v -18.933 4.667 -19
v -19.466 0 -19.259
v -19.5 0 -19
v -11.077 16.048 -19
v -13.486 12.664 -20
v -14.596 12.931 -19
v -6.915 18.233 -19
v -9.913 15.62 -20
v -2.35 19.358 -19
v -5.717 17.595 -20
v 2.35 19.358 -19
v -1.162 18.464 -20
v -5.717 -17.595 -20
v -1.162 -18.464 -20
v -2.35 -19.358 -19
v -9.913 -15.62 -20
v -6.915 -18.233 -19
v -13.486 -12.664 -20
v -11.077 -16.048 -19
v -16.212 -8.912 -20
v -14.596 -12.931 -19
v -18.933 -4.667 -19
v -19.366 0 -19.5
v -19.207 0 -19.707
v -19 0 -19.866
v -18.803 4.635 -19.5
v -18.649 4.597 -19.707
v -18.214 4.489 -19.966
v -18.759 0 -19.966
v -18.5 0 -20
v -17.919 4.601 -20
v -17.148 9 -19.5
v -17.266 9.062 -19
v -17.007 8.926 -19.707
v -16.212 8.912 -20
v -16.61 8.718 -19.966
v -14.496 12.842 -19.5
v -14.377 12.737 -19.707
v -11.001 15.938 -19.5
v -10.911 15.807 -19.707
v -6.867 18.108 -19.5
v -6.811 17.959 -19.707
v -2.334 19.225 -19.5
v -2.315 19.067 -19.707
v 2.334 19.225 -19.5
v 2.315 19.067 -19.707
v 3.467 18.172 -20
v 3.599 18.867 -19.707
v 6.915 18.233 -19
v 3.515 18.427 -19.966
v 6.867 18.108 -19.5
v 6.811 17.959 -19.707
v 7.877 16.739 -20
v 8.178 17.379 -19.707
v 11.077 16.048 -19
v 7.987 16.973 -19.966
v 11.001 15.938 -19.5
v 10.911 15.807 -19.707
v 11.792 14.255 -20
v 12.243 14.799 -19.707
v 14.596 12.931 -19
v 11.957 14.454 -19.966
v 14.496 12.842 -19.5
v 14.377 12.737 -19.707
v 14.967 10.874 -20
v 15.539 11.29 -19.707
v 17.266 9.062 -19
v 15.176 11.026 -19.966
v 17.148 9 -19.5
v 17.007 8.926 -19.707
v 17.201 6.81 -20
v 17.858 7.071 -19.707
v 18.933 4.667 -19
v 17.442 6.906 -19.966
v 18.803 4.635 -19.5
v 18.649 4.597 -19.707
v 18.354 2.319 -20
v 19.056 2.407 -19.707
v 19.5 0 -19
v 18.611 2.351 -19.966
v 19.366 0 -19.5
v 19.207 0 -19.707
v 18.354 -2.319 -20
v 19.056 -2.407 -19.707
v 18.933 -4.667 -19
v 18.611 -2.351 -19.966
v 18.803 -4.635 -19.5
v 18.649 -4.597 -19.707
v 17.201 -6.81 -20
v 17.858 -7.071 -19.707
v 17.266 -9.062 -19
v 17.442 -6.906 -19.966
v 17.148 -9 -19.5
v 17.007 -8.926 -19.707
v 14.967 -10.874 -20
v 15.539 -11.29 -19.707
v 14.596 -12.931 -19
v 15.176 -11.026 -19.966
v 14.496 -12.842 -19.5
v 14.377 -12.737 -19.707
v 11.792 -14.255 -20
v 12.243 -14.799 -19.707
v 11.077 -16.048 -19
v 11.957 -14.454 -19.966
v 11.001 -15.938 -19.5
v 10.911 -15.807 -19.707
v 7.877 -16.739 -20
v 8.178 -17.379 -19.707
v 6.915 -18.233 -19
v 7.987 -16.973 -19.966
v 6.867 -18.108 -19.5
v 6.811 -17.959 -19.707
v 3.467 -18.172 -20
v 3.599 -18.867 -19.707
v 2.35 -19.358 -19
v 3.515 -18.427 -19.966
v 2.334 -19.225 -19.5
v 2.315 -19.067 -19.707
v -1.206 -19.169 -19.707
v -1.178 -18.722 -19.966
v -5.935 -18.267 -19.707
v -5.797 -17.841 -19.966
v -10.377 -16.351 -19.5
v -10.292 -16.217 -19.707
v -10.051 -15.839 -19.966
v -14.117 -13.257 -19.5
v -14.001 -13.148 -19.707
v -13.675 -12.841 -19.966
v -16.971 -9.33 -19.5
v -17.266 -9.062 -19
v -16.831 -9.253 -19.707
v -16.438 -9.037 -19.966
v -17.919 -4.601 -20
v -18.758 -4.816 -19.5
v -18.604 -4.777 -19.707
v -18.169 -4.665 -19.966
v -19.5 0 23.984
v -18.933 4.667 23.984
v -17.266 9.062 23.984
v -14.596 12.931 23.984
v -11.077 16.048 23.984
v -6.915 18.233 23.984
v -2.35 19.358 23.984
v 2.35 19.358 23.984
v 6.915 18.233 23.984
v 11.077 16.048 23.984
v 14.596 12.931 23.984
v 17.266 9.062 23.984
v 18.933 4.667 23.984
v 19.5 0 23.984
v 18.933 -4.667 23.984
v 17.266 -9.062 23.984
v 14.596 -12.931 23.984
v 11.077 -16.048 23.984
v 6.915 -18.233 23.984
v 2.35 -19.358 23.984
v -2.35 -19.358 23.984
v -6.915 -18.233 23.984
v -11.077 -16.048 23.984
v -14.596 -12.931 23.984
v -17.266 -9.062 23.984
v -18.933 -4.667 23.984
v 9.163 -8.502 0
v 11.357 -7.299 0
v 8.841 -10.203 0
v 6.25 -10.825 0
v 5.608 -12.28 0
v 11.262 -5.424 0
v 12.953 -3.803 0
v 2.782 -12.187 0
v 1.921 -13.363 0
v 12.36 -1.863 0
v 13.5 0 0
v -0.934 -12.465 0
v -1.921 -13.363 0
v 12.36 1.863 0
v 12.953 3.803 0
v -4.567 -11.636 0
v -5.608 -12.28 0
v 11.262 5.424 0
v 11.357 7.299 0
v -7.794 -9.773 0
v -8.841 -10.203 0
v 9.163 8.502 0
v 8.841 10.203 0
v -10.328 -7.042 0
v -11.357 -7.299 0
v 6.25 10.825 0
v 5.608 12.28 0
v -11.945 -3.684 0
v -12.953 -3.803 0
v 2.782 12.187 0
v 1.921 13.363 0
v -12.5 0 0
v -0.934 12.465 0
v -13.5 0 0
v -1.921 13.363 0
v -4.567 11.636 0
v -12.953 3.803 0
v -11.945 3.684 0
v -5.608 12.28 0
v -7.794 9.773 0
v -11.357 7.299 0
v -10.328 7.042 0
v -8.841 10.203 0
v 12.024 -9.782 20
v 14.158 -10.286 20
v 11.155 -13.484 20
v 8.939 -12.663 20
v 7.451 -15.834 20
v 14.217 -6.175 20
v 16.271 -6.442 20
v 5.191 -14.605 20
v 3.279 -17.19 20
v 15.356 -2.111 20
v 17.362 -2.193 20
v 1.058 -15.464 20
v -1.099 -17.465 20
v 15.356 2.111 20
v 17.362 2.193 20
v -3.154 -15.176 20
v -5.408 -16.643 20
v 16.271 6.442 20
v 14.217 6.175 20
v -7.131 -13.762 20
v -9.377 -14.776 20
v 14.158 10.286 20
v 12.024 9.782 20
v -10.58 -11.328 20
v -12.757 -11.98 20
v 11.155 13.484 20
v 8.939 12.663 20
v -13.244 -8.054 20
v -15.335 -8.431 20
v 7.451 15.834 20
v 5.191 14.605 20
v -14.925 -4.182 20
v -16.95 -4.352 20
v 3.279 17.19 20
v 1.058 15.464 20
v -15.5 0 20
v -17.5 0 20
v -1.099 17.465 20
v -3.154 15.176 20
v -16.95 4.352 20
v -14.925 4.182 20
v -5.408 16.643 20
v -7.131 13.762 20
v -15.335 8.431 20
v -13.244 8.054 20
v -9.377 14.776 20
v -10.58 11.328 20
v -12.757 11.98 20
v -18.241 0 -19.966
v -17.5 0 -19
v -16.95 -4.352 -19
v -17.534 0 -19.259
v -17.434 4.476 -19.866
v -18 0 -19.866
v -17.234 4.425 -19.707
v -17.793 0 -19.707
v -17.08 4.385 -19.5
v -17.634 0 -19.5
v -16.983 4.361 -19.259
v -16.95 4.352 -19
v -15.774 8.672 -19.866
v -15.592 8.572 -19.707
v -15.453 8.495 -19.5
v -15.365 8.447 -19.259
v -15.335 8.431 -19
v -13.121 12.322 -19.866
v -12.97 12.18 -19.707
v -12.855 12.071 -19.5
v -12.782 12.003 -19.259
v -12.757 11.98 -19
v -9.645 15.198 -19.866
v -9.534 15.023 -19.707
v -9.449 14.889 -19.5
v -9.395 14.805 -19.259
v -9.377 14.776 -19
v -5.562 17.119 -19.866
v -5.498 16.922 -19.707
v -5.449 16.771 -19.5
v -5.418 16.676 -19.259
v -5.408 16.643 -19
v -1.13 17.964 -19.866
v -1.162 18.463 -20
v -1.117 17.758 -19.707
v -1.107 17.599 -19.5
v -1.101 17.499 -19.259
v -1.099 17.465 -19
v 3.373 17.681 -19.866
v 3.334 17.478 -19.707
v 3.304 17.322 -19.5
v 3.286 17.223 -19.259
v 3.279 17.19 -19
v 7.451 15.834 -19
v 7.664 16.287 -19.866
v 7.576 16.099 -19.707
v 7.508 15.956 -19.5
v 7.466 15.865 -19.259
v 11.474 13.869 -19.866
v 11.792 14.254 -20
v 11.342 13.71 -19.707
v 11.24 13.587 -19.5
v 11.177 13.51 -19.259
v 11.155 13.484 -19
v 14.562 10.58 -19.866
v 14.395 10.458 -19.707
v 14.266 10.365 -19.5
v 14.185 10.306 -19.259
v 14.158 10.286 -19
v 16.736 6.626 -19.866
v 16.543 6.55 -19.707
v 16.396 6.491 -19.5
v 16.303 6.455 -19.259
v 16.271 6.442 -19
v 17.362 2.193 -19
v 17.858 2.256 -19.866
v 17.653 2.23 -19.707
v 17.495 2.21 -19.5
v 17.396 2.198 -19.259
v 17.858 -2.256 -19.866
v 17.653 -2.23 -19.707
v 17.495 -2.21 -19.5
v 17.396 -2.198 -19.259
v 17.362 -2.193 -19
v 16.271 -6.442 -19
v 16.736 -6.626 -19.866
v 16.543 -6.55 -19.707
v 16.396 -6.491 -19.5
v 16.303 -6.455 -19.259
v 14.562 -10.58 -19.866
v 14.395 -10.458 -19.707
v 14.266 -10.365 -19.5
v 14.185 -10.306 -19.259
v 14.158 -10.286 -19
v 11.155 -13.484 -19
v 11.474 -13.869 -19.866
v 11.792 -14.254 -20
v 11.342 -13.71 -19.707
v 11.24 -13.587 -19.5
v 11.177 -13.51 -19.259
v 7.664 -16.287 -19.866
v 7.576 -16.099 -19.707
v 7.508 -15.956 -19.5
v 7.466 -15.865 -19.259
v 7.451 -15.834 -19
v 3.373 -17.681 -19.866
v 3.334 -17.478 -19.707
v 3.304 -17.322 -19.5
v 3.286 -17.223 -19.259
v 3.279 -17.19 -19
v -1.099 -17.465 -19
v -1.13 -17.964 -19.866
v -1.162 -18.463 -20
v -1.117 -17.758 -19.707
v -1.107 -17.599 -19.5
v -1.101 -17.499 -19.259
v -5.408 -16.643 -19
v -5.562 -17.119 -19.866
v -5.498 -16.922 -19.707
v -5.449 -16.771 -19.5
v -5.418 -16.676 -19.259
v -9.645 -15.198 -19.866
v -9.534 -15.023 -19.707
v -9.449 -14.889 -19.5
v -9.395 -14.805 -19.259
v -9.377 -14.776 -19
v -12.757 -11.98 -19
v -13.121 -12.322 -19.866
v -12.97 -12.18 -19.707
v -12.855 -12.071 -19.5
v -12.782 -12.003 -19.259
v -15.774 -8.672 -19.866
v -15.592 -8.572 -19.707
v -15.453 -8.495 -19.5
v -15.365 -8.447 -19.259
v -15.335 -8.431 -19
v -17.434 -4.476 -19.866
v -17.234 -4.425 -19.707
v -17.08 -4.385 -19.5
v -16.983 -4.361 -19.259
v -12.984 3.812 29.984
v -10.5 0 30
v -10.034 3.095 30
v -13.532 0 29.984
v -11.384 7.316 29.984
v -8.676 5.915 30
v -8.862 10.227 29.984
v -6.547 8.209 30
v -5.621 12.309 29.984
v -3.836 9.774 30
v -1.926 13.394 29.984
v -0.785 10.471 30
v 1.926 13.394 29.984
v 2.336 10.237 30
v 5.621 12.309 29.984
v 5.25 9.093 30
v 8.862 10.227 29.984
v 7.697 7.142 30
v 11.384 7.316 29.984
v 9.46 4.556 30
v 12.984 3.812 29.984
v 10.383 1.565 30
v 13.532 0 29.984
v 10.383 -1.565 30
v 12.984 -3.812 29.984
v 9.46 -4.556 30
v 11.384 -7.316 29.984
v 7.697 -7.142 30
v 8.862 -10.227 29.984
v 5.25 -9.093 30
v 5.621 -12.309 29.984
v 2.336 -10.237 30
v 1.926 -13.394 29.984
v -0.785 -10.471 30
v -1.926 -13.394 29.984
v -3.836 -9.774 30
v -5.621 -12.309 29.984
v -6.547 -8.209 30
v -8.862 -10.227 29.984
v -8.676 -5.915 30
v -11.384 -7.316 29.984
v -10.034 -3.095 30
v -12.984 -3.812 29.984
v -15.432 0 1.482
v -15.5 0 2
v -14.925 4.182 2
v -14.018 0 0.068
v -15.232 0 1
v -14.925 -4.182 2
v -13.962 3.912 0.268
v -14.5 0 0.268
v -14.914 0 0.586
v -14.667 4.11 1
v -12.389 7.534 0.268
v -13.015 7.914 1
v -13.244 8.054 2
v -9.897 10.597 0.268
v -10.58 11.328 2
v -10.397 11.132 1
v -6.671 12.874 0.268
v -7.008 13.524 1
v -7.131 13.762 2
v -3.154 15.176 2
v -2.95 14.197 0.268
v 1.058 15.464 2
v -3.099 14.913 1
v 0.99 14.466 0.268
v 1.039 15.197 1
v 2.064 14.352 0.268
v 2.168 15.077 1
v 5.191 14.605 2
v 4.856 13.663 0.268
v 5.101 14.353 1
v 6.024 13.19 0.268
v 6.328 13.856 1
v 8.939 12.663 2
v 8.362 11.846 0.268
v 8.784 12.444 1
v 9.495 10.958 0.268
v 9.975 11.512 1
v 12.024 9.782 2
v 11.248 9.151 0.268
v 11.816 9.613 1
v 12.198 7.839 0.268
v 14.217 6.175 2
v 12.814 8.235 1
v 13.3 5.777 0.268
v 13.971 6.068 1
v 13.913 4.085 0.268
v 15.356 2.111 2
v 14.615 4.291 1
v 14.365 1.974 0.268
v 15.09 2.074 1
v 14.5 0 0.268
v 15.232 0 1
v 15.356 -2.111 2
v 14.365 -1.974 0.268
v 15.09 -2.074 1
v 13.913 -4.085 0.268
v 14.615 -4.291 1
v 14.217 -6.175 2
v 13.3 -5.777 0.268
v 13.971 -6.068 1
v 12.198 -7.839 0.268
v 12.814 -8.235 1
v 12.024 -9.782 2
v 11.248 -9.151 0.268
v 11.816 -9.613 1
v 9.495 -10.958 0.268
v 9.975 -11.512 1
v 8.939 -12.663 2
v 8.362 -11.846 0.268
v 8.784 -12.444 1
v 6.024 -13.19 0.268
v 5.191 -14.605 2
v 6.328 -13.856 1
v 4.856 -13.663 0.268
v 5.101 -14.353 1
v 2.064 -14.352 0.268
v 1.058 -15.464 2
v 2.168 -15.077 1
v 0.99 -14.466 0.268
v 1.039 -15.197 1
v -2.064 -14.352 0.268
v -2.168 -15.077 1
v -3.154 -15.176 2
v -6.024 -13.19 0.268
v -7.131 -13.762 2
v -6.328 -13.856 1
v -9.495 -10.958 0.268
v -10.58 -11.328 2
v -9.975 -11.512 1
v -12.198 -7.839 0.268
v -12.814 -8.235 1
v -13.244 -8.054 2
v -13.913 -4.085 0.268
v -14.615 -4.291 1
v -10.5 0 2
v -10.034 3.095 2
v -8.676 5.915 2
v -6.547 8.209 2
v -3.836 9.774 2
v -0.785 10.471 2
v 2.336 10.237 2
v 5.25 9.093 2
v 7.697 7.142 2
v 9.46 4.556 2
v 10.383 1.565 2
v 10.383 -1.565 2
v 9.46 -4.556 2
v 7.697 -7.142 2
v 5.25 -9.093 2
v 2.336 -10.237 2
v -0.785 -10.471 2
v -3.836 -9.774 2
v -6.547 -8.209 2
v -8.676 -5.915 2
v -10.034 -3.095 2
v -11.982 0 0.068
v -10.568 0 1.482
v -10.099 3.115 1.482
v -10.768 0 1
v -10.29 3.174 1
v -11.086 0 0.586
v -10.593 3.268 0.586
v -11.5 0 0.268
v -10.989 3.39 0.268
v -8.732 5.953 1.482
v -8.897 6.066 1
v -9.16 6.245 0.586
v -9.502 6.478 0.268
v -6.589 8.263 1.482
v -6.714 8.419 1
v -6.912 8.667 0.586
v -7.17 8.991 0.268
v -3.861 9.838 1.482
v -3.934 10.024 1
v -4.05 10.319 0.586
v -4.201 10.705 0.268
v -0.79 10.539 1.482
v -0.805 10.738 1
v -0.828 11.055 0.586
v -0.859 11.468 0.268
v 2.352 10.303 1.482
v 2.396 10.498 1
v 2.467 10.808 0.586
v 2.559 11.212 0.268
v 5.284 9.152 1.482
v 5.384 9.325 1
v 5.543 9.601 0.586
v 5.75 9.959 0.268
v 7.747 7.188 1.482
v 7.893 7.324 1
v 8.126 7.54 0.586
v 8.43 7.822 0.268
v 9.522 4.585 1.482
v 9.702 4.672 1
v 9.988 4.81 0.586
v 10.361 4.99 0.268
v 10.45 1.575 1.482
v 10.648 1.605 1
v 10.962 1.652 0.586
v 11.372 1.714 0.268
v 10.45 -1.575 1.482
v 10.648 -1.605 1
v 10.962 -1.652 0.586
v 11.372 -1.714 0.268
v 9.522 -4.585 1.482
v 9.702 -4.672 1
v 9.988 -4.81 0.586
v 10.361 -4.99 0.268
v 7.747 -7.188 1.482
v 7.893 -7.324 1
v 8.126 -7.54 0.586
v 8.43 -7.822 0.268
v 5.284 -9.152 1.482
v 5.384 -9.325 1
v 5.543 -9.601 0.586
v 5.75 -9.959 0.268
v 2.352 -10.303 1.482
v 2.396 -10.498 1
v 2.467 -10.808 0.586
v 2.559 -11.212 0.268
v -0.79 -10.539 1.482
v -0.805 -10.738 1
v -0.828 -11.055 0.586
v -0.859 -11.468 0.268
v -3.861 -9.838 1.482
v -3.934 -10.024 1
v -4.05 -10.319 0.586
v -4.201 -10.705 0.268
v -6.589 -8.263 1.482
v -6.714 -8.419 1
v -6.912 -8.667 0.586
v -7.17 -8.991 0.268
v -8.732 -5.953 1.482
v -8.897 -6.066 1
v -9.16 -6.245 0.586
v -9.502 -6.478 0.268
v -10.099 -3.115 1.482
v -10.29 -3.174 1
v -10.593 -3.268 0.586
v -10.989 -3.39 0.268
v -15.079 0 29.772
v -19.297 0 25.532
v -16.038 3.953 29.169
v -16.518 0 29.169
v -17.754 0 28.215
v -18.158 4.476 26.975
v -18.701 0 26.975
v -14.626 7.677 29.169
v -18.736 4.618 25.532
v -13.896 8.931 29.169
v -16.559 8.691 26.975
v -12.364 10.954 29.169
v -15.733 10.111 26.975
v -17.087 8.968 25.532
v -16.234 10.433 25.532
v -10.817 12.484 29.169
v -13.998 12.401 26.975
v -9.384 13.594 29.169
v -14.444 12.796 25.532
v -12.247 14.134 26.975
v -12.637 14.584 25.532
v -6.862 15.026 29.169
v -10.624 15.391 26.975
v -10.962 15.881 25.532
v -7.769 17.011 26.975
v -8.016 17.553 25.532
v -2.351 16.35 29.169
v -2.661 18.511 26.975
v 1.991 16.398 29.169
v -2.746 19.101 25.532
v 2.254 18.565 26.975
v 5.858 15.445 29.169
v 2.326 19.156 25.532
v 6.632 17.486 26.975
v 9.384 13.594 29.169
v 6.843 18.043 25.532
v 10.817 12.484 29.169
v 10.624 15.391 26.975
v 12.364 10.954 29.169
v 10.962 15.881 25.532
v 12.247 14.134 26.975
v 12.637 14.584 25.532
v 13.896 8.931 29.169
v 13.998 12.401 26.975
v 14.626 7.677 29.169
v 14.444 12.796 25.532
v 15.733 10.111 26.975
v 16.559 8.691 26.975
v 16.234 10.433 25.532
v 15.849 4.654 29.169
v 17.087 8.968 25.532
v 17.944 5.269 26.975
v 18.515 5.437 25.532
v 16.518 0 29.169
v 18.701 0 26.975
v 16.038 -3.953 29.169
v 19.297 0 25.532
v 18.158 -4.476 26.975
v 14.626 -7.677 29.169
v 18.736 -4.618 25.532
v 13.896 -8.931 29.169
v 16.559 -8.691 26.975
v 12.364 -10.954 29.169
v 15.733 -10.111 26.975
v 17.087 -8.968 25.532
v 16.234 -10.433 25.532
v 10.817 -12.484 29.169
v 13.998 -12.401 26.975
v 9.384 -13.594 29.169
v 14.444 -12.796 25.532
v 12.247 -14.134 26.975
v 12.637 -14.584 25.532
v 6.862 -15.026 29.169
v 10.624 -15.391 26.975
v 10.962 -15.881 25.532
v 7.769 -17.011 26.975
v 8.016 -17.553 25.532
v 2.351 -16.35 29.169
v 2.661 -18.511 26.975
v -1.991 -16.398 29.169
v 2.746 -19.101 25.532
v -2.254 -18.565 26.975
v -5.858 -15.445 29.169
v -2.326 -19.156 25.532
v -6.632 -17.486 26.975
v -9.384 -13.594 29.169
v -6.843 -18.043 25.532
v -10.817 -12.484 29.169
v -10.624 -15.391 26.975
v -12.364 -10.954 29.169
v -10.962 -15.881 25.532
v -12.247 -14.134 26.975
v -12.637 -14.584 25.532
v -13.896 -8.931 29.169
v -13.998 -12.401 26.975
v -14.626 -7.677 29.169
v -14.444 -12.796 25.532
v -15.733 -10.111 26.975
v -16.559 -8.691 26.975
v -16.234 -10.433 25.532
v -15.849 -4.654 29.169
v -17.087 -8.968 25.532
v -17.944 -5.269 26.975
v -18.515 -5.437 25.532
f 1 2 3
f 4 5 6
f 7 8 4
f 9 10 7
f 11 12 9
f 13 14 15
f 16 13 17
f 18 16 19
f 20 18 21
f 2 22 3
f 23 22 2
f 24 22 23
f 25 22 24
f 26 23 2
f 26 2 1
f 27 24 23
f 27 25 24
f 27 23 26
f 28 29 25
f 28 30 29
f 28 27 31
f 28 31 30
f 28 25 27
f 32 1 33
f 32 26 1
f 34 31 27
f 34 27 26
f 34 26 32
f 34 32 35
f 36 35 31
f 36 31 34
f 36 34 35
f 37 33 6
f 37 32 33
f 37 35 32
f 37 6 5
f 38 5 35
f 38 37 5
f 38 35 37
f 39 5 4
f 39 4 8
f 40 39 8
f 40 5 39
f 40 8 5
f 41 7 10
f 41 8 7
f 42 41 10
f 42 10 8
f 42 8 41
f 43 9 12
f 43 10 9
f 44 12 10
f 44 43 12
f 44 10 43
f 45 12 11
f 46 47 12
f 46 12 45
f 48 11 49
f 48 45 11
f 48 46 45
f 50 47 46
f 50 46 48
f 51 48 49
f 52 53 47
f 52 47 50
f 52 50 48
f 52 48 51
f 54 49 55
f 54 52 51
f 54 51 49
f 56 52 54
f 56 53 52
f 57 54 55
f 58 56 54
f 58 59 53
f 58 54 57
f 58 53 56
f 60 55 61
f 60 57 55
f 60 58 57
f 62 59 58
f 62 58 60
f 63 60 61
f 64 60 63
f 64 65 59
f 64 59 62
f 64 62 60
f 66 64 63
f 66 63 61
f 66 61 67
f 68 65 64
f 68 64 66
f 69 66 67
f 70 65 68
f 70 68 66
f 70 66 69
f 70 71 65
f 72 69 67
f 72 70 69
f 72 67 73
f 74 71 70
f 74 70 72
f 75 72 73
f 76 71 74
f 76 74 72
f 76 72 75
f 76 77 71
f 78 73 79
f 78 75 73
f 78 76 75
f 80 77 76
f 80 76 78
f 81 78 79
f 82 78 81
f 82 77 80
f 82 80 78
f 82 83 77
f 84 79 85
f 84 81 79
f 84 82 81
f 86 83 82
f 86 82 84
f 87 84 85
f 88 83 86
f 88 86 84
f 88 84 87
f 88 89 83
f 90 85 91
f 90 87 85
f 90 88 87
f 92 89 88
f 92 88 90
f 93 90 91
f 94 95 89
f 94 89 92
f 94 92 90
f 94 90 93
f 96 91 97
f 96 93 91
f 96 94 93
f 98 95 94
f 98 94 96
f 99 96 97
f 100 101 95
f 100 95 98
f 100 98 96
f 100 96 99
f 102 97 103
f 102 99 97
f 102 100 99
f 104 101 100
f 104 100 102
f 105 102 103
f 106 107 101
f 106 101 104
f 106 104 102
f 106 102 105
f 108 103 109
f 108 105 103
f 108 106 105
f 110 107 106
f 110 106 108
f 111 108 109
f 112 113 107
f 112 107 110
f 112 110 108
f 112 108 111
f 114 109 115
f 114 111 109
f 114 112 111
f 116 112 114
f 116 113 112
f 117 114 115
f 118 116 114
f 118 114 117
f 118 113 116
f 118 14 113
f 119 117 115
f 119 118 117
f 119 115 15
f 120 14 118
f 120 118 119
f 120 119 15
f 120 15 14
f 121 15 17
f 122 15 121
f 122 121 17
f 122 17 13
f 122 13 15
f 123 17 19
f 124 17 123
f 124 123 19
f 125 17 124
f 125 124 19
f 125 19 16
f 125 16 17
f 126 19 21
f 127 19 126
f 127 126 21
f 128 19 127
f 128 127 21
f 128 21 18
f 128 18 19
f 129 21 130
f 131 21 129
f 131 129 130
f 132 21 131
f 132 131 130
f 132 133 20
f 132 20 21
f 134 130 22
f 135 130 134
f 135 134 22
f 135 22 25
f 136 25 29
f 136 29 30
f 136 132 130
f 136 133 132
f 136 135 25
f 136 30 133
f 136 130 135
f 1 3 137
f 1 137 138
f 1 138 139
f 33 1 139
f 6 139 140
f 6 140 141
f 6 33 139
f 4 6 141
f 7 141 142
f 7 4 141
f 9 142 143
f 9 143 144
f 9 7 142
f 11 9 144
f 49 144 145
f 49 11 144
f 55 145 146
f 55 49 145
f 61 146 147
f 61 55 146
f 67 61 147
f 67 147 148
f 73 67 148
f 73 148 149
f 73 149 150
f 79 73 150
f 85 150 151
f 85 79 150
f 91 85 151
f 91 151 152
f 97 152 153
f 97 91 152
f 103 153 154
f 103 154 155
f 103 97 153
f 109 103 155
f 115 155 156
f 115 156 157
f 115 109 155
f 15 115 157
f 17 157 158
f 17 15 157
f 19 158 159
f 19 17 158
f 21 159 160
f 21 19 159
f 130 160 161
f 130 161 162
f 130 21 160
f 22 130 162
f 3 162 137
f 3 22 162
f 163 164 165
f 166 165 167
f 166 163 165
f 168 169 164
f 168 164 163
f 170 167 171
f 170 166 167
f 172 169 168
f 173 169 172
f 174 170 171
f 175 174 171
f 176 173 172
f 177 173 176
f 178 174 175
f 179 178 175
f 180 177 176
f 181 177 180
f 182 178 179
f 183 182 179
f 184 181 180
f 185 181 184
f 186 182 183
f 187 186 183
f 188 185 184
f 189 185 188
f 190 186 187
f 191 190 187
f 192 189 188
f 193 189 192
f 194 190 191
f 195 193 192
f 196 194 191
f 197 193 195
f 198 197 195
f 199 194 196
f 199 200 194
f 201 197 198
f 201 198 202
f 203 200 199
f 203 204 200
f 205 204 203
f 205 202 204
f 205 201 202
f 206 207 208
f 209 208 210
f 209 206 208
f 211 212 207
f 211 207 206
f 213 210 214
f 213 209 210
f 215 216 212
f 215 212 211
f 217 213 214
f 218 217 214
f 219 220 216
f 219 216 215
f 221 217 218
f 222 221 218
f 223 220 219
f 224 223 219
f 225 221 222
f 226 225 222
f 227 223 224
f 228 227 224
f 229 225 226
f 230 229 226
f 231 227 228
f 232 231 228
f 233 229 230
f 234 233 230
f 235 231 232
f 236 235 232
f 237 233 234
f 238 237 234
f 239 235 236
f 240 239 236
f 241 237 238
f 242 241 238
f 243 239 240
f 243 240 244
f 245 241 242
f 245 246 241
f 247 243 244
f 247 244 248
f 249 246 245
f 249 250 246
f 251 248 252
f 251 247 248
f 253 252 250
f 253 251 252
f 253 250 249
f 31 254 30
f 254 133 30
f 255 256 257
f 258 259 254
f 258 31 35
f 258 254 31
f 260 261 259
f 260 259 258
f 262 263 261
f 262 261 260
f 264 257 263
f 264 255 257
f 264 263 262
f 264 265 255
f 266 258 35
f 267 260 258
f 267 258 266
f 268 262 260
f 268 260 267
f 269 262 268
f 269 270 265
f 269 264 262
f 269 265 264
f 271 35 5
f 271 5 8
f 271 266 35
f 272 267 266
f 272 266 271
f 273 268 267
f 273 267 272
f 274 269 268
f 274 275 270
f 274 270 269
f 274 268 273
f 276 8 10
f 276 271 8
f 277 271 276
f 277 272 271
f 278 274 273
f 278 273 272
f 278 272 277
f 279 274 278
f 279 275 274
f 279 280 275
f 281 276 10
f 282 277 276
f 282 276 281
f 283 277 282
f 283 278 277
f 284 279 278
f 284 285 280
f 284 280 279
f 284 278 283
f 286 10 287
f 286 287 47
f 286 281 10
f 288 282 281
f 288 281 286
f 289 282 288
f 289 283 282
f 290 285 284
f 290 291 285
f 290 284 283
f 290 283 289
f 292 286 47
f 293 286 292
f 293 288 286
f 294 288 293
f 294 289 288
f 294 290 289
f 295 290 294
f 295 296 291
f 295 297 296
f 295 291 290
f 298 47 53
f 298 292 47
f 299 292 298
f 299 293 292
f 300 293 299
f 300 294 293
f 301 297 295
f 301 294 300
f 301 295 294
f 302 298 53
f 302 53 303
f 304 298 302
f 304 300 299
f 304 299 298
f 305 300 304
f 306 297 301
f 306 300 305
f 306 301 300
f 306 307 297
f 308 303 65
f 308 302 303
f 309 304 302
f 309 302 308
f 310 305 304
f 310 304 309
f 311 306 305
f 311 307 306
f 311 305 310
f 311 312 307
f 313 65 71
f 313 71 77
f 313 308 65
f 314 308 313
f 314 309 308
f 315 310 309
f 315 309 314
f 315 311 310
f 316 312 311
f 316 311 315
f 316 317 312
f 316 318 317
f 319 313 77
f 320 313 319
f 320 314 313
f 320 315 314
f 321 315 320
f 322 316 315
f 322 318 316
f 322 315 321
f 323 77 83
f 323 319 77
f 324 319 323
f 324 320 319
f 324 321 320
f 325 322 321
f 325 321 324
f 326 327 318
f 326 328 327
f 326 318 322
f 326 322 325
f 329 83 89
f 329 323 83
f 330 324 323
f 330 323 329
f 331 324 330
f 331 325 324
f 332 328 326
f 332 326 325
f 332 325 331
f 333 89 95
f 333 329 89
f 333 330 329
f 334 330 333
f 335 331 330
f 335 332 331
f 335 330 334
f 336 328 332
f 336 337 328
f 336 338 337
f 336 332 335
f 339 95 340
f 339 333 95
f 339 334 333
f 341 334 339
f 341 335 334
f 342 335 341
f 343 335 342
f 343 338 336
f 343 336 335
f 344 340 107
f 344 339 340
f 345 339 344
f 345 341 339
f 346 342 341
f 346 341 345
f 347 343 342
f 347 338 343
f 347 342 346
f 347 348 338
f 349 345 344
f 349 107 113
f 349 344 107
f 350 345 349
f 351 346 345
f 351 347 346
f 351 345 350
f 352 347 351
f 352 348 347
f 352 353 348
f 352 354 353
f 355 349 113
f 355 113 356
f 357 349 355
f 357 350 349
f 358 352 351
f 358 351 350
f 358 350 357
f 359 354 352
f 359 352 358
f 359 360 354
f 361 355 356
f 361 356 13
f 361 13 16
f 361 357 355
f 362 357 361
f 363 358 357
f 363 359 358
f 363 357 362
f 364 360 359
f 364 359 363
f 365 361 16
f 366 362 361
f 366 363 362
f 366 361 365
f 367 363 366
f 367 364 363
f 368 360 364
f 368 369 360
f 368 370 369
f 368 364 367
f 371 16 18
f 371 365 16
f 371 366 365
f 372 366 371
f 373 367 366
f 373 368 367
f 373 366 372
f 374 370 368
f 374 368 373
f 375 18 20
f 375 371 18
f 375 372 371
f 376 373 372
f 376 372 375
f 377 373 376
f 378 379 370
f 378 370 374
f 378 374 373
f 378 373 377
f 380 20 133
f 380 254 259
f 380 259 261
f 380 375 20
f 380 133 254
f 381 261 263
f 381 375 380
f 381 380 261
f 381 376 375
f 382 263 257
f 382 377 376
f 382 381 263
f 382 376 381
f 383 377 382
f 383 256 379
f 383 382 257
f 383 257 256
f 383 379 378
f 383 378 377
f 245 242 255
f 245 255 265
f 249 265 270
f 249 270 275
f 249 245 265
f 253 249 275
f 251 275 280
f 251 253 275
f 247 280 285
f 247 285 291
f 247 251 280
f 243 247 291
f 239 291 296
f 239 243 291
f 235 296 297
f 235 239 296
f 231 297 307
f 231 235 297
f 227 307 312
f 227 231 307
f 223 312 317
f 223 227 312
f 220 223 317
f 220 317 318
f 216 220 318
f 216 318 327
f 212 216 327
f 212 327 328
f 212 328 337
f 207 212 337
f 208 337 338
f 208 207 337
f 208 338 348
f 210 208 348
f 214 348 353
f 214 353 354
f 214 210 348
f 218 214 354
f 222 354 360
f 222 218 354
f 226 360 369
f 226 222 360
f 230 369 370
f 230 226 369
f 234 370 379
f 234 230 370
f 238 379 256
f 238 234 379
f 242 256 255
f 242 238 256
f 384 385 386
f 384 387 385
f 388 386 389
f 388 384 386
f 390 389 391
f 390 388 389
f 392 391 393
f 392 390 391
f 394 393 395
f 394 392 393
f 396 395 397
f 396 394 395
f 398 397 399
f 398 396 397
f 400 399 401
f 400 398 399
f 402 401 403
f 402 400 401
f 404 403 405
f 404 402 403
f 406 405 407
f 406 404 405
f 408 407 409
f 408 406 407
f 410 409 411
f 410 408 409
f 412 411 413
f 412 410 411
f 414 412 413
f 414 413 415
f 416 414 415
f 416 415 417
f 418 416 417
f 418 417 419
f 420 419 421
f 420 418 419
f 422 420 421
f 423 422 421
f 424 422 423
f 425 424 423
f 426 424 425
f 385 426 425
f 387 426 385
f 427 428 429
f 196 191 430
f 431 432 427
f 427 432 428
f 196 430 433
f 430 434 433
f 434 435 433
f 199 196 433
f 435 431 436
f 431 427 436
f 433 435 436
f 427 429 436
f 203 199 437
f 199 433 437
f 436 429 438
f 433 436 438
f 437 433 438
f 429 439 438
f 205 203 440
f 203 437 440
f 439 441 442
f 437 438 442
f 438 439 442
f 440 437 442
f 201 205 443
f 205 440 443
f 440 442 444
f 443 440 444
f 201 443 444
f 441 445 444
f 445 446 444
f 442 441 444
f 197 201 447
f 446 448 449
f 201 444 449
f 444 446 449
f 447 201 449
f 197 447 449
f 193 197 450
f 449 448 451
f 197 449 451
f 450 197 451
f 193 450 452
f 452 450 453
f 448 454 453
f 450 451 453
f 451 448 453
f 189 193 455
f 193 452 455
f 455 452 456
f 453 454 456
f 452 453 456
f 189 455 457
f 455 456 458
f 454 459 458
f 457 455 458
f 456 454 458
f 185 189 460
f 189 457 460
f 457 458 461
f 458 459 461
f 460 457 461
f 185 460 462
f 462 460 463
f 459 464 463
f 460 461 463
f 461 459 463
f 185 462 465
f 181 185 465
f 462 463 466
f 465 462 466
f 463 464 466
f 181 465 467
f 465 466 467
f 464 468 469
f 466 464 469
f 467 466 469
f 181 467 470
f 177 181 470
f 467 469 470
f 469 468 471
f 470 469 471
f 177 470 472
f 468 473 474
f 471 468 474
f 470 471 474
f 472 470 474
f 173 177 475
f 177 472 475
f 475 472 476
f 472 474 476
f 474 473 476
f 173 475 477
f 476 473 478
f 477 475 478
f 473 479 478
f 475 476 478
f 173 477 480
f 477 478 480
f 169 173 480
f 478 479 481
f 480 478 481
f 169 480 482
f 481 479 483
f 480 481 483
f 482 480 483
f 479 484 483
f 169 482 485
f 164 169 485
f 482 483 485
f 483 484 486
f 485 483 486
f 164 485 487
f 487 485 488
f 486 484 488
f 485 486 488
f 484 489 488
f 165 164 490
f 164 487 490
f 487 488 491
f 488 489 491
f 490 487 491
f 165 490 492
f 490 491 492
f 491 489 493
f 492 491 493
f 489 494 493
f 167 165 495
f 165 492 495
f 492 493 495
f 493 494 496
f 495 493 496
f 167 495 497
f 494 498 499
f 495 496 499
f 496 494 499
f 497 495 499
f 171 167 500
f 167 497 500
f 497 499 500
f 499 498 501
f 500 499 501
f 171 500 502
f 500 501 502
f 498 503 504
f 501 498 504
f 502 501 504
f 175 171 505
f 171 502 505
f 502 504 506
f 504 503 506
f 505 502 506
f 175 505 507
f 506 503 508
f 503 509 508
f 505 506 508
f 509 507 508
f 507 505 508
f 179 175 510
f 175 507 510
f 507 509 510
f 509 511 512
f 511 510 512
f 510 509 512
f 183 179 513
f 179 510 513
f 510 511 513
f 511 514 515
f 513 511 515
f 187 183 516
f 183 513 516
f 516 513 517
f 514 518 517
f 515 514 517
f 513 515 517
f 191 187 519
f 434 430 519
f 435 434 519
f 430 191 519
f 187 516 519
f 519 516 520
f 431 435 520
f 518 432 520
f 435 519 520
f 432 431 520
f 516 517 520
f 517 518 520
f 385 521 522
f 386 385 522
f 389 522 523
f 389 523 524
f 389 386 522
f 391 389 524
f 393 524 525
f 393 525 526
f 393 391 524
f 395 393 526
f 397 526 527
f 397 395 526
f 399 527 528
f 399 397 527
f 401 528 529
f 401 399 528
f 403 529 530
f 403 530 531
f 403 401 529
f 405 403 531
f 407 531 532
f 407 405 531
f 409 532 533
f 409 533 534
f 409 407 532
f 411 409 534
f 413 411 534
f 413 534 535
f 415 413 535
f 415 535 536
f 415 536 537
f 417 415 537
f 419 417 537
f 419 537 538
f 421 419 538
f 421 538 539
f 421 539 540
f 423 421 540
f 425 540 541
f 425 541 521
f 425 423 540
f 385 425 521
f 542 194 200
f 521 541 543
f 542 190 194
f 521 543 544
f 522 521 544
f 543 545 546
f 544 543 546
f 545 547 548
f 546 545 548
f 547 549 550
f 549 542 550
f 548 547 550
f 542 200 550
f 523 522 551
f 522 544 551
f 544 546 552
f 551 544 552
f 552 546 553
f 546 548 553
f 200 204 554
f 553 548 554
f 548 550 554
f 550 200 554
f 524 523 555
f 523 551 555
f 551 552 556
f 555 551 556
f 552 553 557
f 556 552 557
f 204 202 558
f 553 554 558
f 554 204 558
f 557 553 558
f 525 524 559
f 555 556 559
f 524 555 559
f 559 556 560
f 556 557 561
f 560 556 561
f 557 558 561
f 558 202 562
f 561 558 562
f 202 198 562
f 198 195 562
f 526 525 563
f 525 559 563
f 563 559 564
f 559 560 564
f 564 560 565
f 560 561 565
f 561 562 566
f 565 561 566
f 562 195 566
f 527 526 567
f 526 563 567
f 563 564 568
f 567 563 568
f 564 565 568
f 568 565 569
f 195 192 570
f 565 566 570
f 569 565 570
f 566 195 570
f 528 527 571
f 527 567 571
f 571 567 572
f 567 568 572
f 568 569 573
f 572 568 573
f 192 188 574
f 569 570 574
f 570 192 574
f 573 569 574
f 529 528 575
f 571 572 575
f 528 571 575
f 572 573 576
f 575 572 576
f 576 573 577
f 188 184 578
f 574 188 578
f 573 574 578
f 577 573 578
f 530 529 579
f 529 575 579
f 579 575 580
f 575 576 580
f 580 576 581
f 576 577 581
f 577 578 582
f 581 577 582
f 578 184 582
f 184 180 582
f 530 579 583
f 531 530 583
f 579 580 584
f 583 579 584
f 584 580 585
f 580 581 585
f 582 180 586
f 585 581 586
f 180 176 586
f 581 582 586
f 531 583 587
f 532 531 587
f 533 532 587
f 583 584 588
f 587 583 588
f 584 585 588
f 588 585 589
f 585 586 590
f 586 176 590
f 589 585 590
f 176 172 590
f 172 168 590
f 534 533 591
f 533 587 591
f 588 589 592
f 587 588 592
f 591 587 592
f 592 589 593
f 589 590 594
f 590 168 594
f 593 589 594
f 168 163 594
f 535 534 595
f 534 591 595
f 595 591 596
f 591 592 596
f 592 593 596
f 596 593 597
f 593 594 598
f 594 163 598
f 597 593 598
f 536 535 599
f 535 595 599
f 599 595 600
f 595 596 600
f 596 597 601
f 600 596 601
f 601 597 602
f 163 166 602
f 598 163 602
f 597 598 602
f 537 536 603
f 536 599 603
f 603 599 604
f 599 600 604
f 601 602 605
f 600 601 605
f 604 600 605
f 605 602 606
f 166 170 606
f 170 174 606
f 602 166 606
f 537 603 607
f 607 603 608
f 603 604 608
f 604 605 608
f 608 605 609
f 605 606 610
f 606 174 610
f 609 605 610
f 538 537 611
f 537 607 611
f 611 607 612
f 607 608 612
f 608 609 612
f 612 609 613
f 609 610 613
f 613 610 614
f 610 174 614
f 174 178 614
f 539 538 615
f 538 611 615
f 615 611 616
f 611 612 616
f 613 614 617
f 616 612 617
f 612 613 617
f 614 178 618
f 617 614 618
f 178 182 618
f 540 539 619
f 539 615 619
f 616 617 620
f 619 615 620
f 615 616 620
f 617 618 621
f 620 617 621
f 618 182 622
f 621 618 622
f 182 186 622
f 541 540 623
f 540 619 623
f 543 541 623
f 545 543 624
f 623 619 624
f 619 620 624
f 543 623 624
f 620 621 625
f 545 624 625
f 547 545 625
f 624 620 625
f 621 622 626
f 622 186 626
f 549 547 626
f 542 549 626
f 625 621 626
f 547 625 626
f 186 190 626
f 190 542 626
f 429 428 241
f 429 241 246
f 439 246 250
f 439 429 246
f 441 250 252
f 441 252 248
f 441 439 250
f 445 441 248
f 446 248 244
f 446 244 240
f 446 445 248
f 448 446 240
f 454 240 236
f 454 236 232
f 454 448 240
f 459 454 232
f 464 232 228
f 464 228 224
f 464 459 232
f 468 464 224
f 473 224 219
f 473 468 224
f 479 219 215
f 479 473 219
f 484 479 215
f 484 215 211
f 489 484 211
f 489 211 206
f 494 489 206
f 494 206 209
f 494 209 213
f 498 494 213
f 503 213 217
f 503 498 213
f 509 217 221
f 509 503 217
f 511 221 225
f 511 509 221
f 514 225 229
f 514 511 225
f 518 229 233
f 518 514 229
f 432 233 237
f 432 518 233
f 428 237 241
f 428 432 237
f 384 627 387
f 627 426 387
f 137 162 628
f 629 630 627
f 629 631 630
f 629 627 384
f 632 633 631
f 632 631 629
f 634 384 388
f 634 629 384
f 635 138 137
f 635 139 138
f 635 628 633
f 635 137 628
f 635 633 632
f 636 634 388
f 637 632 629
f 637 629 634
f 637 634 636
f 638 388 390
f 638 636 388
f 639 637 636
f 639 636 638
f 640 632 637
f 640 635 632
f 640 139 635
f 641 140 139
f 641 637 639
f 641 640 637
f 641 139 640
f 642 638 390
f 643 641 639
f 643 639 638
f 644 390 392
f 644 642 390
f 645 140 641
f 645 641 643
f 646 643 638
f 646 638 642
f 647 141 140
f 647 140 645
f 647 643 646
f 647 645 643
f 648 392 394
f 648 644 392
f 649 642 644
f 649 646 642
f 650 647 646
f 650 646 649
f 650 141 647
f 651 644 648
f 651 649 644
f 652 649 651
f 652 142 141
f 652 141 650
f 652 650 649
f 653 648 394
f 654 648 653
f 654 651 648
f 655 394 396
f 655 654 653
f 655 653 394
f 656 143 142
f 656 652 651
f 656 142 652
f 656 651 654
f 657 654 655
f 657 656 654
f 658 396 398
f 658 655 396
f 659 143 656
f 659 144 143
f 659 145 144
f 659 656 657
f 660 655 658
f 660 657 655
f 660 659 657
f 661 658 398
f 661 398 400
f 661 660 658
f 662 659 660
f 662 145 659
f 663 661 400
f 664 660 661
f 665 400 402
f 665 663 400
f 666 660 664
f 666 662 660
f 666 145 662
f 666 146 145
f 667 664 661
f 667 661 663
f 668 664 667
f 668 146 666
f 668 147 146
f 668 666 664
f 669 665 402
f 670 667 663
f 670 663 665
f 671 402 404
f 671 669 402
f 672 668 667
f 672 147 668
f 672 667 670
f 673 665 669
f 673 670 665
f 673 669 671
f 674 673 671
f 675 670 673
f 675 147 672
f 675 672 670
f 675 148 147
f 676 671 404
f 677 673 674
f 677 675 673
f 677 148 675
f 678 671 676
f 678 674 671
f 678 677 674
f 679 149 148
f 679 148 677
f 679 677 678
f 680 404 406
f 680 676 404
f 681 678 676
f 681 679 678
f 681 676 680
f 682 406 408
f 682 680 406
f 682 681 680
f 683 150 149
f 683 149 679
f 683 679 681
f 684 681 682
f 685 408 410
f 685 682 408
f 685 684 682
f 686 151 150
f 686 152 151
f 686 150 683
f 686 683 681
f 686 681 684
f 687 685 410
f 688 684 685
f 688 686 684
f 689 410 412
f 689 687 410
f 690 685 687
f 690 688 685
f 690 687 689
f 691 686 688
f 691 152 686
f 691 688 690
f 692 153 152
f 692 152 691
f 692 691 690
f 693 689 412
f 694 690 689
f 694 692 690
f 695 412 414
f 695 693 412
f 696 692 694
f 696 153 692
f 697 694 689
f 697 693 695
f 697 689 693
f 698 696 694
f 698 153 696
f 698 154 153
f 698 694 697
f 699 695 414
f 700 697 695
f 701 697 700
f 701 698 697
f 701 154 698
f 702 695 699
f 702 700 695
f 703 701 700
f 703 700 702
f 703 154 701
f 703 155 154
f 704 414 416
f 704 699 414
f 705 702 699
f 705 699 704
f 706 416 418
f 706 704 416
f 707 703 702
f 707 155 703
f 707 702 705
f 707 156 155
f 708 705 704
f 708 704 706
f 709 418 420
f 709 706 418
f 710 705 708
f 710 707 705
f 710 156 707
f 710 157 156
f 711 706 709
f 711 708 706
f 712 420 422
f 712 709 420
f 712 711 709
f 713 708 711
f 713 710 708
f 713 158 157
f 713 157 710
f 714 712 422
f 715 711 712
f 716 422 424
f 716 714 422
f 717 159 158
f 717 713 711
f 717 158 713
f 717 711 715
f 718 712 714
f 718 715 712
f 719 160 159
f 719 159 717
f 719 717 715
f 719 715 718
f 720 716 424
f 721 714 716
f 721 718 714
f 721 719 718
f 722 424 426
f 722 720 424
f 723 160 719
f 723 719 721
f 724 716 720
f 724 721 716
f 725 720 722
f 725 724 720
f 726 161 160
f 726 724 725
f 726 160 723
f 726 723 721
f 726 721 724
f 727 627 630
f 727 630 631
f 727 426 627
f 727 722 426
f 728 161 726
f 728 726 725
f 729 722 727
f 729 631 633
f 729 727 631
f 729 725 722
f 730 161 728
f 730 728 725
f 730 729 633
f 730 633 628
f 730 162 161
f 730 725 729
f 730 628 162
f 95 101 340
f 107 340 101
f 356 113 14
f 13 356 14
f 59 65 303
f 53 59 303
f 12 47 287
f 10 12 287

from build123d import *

# Parameters (mm, degrees)
F2_R = 0.99999
F3_R = 2


# Not quite as in the source:
# - a fillet or chamfer is up to 0.001 mm smaller than in the source, because OpenCascade refuses the exact size


with BuildPart() as f1:
    # F0 (on Front) → F1 (revolve)
    with BuildSketch(Plane.XZ):
        with BuildLine():
            Line((-10.5, 0), (-10.5, 30))
            Line((-10.5, 30), (-13.532049904, 29.9838036175))
            ThreePointArc((-13.532049904, 29.9838036175), (-17.7539569476, 28.2151833802), (-19.5, 23.9838892179))
            Line((-19.5, 23.9838892179), (-19.5, 20))
            Line((-19.5, 20), (-19.5, -20))
            Line((-19.5, -20), (-17.5, -20))
            Line((-17.5, -20), (-17.5, 20))
            Line((-17.5, 20), (-15.5, 20))
            Line((-15.5, 20), (-15.5, 0))
            Line((-15.5, 0), (-10.5, 0))
        make_face()
    revolve(axis=Axis((0, 0, 11.9062974118), (0, 0, -1)))

    # F2 (radius 1 in the source; OpenCascade refuses exactly that, so slightly less here)
    f2_edges = [f1.edges().sort_by_distance(p)[0] for p in [
        (17.5, 0, -20),
        (19.5, 0, -20),
    ]]
    fillet(f2_edges, radius=F2_R)

    # F3
    f3_edges = [f1.edges().sort_by_distance(p)[0] for p in [
        (10.5, 0, 0),
        (15.5, 0, 0),
    ]]
    fillet(f3_edges, radius=F3_R)


solid = f1.part
